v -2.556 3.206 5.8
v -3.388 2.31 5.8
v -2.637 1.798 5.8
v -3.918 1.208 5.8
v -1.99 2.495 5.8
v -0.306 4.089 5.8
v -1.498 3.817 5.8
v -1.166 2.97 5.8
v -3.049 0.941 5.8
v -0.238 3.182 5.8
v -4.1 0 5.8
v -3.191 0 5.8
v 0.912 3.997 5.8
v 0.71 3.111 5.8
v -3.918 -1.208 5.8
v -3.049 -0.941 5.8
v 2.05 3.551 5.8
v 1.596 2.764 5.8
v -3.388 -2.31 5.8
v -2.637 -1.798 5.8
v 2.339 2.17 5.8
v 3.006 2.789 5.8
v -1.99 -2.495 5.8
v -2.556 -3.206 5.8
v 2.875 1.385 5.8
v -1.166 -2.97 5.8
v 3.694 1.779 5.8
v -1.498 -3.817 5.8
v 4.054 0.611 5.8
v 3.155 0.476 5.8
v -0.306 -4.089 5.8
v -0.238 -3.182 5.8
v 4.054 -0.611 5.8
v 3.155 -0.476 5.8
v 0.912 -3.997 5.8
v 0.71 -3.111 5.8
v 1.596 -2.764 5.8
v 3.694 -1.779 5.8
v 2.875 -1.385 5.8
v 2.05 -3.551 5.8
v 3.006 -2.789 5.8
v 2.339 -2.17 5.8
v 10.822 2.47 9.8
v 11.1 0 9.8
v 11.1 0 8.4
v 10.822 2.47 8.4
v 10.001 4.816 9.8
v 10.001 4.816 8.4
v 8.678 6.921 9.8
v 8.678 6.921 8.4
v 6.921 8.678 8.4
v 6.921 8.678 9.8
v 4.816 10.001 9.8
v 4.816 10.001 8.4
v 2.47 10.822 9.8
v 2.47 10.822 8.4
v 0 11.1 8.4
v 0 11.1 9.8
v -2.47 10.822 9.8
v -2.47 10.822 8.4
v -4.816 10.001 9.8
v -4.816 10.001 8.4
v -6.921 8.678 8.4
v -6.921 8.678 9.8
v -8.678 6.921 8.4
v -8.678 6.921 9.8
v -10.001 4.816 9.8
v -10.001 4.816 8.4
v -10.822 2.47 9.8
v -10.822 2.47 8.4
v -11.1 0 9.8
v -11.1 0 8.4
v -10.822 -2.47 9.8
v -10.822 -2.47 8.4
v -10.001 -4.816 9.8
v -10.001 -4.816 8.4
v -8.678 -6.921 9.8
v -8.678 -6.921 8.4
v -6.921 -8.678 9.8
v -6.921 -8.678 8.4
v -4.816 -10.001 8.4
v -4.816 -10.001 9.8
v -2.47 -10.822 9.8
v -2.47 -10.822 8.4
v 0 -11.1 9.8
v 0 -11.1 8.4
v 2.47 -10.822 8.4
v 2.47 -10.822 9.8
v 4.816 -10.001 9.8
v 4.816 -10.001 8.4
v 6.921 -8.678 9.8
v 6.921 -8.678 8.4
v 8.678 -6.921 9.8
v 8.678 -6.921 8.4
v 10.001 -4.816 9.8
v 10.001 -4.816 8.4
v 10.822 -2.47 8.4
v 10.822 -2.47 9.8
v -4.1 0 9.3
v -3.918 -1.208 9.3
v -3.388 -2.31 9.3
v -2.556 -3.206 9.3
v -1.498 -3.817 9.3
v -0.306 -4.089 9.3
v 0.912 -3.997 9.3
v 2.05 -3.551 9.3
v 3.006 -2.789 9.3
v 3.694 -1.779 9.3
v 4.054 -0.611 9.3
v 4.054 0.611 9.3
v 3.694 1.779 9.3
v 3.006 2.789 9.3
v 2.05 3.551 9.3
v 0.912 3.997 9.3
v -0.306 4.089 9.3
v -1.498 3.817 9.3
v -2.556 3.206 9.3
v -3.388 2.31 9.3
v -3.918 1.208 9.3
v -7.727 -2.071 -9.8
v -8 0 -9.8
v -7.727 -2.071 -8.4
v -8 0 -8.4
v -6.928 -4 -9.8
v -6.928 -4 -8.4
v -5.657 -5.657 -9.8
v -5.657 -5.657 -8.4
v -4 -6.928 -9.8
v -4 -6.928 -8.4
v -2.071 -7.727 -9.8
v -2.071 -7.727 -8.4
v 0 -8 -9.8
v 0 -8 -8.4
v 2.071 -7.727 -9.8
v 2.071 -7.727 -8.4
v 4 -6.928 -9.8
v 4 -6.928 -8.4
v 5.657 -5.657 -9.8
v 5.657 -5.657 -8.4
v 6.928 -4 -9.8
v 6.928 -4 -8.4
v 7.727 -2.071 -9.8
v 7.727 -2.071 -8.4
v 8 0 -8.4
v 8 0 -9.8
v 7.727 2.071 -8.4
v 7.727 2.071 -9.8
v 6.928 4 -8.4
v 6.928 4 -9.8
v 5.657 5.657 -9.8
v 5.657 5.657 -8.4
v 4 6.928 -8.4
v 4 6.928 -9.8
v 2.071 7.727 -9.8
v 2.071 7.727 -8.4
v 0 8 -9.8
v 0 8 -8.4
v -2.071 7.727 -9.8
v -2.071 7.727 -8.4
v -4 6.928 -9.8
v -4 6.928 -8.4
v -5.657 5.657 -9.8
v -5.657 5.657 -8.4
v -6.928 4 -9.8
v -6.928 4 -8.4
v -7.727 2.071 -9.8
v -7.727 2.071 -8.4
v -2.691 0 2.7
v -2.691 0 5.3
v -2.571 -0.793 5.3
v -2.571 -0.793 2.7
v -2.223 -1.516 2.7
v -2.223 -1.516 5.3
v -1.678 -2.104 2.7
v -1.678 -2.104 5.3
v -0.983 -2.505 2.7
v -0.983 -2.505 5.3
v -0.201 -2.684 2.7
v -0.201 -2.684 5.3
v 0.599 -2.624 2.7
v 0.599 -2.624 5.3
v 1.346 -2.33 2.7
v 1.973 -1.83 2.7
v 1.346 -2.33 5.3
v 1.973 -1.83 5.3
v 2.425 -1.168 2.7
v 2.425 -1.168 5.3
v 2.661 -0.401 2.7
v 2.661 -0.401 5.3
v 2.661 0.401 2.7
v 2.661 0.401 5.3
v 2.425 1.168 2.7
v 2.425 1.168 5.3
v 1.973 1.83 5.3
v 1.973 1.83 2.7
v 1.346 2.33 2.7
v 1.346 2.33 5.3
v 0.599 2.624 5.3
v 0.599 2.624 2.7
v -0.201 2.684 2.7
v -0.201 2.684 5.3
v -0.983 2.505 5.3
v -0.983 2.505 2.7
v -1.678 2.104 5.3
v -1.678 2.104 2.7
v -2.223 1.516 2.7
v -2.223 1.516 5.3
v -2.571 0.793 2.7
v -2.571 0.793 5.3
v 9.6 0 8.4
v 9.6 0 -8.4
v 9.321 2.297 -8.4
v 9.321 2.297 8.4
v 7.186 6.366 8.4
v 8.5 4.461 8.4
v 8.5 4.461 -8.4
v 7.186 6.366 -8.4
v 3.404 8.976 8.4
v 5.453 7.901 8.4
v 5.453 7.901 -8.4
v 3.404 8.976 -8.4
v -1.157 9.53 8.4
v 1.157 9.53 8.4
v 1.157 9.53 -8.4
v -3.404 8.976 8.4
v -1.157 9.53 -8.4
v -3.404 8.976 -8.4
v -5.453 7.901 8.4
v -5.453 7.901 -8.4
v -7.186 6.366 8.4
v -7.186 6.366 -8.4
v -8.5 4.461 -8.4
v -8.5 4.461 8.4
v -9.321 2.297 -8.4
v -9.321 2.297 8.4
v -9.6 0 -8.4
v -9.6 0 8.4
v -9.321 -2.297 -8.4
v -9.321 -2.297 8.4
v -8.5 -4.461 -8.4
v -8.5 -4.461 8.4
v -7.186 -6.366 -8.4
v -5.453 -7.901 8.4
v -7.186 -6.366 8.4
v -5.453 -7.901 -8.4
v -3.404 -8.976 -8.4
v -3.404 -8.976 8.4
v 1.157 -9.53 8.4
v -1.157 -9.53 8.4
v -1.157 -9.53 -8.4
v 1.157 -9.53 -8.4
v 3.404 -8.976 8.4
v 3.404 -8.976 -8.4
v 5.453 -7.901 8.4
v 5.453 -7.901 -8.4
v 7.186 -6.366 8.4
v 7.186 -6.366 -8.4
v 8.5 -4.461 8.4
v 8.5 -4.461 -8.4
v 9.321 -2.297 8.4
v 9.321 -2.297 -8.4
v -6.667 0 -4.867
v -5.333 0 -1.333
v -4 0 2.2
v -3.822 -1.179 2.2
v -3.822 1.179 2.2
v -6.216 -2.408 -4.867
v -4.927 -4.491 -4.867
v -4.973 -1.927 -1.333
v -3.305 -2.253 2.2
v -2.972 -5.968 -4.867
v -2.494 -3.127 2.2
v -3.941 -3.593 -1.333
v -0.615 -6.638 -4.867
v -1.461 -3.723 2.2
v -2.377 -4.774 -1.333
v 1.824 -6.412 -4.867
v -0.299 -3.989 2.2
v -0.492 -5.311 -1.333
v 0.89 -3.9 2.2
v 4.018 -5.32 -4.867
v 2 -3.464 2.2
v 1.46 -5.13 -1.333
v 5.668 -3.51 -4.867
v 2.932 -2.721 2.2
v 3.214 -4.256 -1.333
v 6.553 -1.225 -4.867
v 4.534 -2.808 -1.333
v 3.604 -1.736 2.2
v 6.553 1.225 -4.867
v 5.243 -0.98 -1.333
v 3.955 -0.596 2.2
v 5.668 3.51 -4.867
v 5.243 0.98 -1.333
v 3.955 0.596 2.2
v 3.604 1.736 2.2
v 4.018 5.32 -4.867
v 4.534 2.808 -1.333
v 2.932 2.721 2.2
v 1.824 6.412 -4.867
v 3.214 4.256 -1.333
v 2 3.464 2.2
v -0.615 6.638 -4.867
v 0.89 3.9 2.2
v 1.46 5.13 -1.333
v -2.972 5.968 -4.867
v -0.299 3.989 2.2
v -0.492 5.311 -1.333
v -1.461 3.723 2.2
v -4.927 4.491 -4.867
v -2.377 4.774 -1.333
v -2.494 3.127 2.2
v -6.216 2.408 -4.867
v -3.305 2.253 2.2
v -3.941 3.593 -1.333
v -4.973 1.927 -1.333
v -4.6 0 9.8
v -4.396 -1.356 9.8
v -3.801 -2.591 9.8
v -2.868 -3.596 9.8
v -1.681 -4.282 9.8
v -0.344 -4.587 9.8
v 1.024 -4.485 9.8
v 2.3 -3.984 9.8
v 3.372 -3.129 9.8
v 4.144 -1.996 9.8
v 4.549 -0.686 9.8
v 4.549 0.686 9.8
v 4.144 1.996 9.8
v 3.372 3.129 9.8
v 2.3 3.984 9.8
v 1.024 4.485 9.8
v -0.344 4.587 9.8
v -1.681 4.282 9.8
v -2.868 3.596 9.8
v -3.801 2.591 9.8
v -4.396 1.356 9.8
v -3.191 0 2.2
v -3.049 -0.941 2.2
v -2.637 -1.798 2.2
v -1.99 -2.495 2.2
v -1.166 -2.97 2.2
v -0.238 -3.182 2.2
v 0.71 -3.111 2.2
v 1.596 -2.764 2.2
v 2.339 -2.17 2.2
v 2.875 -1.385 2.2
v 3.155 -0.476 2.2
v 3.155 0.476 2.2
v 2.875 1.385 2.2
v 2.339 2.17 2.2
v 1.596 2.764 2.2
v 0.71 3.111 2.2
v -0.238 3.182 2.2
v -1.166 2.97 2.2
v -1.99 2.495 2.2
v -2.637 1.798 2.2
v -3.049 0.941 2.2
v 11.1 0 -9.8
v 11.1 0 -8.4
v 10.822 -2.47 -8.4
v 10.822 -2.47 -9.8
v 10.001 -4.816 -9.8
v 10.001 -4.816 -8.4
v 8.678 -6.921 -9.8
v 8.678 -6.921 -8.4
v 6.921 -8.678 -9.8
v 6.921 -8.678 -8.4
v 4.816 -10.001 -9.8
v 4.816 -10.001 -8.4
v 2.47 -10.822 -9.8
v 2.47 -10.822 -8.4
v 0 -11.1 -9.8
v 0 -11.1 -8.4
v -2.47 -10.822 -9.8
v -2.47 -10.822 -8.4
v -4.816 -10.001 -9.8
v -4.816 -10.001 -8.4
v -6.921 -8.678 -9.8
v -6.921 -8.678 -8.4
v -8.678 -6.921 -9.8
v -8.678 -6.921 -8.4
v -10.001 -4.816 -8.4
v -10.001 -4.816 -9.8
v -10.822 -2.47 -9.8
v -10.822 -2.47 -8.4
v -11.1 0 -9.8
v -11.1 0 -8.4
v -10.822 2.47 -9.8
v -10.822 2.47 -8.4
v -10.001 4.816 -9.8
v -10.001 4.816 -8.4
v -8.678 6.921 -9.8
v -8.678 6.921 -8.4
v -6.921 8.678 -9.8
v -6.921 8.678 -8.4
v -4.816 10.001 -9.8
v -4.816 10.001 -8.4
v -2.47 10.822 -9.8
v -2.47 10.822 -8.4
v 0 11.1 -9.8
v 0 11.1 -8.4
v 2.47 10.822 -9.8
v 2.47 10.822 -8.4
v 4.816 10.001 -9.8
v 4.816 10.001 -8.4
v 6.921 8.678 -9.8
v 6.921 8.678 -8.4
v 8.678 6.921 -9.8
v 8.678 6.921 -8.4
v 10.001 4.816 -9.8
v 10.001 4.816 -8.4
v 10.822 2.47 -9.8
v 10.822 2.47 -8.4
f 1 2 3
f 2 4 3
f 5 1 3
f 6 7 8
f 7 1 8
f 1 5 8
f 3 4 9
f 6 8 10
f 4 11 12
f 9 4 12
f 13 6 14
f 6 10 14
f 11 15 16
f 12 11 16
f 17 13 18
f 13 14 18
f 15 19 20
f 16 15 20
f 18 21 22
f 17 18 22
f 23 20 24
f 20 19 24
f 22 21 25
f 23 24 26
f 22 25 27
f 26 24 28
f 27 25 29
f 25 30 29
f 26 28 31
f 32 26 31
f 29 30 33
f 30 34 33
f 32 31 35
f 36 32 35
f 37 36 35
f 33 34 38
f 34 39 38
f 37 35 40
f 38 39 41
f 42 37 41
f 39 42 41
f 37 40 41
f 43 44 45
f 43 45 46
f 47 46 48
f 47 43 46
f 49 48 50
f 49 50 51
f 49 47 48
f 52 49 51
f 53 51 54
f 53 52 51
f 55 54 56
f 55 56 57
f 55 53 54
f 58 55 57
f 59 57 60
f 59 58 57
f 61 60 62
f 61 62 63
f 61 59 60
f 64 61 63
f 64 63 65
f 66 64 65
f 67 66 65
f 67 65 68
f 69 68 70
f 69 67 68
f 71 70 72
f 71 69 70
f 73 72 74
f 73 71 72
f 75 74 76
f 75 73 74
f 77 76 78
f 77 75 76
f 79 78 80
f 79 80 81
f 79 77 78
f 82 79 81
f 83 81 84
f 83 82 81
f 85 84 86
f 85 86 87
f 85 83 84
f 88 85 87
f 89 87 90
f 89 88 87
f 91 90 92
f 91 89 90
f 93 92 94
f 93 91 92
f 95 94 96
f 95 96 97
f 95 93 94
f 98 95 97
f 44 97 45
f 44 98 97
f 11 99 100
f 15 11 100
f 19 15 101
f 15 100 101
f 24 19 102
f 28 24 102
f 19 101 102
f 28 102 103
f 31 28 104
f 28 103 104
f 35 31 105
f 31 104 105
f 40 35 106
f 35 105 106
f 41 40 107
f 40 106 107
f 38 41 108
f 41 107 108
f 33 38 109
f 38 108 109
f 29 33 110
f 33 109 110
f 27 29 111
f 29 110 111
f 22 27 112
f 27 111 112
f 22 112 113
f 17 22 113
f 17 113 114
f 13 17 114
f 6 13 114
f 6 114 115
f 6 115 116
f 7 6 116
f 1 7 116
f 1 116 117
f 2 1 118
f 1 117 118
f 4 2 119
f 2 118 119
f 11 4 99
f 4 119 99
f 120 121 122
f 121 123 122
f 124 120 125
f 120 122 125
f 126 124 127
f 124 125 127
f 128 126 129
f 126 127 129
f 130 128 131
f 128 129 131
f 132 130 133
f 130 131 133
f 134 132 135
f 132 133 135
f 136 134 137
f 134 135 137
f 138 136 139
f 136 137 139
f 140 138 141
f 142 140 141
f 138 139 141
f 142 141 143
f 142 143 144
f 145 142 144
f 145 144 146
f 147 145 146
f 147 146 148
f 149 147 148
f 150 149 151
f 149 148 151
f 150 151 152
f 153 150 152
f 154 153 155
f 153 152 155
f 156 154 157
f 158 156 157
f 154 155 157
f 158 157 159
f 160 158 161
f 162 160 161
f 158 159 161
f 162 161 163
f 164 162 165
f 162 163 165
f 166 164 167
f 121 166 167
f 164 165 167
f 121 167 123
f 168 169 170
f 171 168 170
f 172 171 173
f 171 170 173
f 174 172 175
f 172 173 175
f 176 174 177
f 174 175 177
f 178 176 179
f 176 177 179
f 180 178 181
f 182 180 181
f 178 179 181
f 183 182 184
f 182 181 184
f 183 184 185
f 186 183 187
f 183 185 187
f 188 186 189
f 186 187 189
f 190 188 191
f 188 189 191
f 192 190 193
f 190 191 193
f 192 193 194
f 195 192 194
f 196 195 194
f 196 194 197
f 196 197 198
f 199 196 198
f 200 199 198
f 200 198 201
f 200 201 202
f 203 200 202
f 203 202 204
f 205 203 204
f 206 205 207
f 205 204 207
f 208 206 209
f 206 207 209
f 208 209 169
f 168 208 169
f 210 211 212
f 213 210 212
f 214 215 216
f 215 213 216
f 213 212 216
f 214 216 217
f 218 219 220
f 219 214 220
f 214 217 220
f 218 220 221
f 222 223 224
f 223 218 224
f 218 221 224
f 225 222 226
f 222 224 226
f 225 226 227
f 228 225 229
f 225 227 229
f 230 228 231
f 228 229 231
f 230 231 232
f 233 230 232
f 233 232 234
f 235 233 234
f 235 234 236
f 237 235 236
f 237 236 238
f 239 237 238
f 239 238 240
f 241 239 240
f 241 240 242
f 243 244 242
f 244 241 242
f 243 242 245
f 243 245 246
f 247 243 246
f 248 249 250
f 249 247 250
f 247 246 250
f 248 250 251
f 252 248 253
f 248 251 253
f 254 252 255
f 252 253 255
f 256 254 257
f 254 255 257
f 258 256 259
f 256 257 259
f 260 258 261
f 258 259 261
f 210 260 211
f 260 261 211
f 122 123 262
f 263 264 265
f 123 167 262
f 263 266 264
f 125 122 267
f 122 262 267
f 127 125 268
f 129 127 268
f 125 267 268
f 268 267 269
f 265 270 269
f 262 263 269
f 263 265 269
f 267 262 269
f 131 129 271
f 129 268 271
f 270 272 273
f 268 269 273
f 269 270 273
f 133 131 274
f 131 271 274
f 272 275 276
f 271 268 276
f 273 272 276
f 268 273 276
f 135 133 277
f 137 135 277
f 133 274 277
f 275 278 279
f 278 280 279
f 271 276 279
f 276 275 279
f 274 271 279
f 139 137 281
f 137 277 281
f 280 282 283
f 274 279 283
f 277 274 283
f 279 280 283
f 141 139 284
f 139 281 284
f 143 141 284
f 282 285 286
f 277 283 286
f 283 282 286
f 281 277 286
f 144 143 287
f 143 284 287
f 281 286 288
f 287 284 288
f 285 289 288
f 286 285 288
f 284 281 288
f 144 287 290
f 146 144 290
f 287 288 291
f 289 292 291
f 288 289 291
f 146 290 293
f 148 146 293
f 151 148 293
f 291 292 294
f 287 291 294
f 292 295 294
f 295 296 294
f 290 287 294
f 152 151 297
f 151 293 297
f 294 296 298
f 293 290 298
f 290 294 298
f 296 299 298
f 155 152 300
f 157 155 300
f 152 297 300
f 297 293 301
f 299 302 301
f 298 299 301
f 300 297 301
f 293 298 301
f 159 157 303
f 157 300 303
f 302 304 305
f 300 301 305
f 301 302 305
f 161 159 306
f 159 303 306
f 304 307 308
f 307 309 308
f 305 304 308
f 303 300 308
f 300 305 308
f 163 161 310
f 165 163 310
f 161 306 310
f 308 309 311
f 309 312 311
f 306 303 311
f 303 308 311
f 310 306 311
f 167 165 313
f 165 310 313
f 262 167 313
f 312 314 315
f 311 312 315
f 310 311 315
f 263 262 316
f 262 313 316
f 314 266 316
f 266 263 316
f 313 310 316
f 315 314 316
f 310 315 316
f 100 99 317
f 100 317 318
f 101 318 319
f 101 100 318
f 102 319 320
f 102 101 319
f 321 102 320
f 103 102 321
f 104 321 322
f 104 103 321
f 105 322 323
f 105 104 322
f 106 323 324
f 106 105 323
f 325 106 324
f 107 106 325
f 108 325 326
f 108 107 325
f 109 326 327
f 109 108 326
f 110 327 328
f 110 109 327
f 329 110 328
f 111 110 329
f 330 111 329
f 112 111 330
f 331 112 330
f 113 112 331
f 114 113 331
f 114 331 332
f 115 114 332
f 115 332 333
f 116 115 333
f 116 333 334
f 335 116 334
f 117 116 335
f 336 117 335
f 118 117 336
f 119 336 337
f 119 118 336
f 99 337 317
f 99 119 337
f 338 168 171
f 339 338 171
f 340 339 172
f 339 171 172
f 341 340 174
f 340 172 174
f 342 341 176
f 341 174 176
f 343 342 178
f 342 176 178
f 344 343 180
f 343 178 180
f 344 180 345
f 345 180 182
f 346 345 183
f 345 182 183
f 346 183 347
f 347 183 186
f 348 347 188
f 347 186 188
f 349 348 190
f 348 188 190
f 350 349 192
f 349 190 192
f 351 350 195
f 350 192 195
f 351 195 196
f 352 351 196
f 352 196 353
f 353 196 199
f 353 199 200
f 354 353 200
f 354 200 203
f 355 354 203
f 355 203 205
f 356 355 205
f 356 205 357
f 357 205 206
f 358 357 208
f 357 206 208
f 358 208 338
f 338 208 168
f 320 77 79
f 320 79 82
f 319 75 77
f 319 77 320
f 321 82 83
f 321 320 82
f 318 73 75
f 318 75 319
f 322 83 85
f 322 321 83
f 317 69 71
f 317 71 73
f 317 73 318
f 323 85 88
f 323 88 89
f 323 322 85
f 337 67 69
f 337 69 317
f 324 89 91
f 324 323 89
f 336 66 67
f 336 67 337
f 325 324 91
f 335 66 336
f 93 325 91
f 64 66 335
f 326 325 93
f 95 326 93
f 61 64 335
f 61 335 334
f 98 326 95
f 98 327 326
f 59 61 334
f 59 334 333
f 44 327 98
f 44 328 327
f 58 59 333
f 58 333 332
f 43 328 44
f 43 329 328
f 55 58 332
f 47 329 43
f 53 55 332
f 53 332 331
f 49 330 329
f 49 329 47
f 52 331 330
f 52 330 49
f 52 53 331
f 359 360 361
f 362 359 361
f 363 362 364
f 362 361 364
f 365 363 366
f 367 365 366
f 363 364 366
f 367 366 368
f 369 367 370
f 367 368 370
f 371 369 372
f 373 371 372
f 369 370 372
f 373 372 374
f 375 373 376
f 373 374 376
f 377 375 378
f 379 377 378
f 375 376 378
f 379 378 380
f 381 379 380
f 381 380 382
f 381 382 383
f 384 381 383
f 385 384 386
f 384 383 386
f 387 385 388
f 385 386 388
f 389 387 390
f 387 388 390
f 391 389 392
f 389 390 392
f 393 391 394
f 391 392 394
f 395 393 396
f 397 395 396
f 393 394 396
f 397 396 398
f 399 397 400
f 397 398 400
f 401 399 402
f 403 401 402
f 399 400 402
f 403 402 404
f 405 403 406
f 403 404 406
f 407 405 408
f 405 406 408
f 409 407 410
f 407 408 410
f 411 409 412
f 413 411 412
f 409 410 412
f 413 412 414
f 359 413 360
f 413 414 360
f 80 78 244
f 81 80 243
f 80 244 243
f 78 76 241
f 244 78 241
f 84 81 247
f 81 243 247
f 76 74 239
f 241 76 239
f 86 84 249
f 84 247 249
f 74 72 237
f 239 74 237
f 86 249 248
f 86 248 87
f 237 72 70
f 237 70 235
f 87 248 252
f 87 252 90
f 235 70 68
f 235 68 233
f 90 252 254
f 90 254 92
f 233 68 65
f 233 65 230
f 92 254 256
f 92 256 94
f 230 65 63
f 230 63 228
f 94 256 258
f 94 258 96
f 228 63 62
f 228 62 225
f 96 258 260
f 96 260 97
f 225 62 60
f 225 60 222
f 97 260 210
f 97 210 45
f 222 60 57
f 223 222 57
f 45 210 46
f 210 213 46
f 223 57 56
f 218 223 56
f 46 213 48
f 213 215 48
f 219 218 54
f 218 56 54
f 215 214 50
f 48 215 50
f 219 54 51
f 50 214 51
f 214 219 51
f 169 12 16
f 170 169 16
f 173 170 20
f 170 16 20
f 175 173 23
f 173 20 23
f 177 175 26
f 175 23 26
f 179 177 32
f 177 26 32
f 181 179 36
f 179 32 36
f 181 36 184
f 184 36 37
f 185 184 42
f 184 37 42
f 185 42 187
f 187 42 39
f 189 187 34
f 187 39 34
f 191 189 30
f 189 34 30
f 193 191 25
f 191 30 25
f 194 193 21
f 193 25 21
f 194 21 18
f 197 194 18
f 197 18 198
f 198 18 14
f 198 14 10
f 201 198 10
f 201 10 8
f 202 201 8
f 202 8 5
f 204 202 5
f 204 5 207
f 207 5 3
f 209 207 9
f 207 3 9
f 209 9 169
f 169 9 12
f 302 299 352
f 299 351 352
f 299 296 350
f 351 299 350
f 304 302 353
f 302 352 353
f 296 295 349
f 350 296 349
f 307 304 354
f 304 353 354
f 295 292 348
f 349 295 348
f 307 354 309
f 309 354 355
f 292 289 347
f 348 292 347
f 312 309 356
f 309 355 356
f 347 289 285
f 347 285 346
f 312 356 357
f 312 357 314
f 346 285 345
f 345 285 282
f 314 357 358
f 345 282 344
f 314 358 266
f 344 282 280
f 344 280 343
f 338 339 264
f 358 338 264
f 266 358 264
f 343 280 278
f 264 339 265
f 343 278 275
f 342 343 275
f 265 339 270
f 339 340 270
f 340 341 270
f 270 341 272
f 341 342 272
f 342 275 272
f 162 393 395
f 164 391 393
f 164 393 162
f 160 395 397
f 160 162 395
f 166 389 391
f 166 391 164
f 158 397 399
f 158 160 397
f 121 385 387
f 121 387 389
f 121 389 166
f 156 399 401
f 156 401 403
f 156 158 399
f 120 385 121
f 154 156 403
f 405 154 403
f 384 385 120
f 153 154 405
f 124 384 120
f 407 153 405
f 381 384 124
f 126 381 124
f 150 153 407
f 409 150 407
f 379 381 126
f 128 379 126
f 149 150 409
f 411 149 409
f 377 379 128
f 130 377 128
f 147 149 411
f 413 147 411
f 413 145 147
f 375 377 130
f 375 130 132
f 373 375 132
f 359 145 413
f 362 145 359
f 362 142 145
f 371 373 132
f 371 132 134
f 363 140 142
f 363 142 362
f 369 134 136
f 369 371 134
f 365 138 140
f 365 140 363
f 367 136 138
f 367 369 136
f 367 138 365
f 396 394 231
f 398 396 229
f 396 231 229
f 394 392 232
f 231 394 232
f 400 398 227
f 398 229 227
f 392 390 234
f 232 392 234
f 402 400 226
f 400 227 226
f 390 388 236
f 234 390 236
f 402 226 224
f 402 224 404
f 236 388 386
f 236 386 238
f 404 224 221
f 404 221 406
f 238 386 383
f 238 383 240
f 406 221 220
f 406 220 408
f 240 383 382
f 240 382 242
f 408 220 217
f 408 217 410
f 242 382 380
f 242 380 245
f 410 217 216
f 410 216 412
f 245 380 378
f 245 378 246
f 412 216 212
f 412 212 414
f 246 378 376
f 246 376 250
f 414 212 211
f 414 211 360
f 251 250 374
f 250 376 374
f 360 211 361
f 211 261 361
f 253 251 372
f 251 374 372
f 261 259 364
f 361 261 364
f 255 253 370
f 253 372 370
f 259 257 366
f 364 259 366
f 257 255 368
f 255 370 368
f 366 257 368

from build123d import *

# Parameters (mm, degrees)
AUFSATZ_LINEAR_AUSTRAGEN1_DEPTH      = 9.8
AUFSATZ_LINEAR_AUSTRAGEN1_DEPTH_BACK = 9.8
SKIZZE1_R                            = 9.6
SKIZZE2_R                            = 11.1
AUFSATZ_LINEAR_AUSTRAGEN2_DEPTH      = 1.4
AUFSATZ_LINEAR_START                 = -1.4
SKIZZE3_R                            = 11.1
AUFSATZ_LINEAR_AUSTRAGEN3_DEPTH      = 1.4
FASE1_SIZE                           = 0.5


with BuildPart() as part:
    # Skizze1 → Aufsatz-Linear austragen1 (new, two sides: drawn at the far end of the back side and taken through both)
    with BuildSketch(Plane.XY.offset(-AUFSATZ_LINEAR_AUSTRAGEN1_DEPTH_BACK)):
        Circle(SKIZZE1_R)
    extrude(amount=AUFSATZ_LINEAR_AUSTRAGEN1_DEPTH + AUFSATZ_LINEAR_AUSTRAGEN1_DEPTH_BACK)

    # Skizze2 → Aufsatz-Linear austragen2 (add)
    with BuildSketch(Plane.XY.offset(9.8)):
        Circle(SKIZZE2_R)
    extrude(amount=-AUFSATZ_LINEAR_AUSTRAGEN2_DEPTH)

    # Skizze3 → Aufsatz-Linear austragen3 (add)
    with BuildSketch(Plane(origin=(0, 0, -9.8), x_dir=(-1, 0, 0), z_dir=(0, 0, -1)).offset(AUFSATZ_LINEAR_START)):
        Circle(SKIZZE3_R)
    extrude(amount=AUFSATZ_LINEAR_AUSTRAGEN3_DEPTH)

    # Skizze8 → Schnitt-Rotation1 (revolve, cut)
    with BuildSketch(Plane(origin=(0, 0, 0), x_dir=(0, 0, -1), z_dir=(1, 0, 0))):
        Polygon((9.8, 0), (9.8, 8), (8.4, 8), (-2.2, 4), (-2.2, 2.691026714), (-5.8, 2.691026714), (-5.8, 4.1), (-9.8, 4.1), (-9.8, 0), align=None)
    revolve(axis=Axis((0, 0, -9.8), (0, 0, 1)), mode=Mode.SUBTRACT)

    # Fase1
    fase1_edges = [part.edges().sort_by_distance(p)[0] for p in [
        (0, -2.691026714, 5.8),
        (0, -2.691026714, 2.2),
        (0, -4.1, 9.8),
    ]]
    chamfer(fase1_edges, length=FASE1_SIZE)


solid = part.part
